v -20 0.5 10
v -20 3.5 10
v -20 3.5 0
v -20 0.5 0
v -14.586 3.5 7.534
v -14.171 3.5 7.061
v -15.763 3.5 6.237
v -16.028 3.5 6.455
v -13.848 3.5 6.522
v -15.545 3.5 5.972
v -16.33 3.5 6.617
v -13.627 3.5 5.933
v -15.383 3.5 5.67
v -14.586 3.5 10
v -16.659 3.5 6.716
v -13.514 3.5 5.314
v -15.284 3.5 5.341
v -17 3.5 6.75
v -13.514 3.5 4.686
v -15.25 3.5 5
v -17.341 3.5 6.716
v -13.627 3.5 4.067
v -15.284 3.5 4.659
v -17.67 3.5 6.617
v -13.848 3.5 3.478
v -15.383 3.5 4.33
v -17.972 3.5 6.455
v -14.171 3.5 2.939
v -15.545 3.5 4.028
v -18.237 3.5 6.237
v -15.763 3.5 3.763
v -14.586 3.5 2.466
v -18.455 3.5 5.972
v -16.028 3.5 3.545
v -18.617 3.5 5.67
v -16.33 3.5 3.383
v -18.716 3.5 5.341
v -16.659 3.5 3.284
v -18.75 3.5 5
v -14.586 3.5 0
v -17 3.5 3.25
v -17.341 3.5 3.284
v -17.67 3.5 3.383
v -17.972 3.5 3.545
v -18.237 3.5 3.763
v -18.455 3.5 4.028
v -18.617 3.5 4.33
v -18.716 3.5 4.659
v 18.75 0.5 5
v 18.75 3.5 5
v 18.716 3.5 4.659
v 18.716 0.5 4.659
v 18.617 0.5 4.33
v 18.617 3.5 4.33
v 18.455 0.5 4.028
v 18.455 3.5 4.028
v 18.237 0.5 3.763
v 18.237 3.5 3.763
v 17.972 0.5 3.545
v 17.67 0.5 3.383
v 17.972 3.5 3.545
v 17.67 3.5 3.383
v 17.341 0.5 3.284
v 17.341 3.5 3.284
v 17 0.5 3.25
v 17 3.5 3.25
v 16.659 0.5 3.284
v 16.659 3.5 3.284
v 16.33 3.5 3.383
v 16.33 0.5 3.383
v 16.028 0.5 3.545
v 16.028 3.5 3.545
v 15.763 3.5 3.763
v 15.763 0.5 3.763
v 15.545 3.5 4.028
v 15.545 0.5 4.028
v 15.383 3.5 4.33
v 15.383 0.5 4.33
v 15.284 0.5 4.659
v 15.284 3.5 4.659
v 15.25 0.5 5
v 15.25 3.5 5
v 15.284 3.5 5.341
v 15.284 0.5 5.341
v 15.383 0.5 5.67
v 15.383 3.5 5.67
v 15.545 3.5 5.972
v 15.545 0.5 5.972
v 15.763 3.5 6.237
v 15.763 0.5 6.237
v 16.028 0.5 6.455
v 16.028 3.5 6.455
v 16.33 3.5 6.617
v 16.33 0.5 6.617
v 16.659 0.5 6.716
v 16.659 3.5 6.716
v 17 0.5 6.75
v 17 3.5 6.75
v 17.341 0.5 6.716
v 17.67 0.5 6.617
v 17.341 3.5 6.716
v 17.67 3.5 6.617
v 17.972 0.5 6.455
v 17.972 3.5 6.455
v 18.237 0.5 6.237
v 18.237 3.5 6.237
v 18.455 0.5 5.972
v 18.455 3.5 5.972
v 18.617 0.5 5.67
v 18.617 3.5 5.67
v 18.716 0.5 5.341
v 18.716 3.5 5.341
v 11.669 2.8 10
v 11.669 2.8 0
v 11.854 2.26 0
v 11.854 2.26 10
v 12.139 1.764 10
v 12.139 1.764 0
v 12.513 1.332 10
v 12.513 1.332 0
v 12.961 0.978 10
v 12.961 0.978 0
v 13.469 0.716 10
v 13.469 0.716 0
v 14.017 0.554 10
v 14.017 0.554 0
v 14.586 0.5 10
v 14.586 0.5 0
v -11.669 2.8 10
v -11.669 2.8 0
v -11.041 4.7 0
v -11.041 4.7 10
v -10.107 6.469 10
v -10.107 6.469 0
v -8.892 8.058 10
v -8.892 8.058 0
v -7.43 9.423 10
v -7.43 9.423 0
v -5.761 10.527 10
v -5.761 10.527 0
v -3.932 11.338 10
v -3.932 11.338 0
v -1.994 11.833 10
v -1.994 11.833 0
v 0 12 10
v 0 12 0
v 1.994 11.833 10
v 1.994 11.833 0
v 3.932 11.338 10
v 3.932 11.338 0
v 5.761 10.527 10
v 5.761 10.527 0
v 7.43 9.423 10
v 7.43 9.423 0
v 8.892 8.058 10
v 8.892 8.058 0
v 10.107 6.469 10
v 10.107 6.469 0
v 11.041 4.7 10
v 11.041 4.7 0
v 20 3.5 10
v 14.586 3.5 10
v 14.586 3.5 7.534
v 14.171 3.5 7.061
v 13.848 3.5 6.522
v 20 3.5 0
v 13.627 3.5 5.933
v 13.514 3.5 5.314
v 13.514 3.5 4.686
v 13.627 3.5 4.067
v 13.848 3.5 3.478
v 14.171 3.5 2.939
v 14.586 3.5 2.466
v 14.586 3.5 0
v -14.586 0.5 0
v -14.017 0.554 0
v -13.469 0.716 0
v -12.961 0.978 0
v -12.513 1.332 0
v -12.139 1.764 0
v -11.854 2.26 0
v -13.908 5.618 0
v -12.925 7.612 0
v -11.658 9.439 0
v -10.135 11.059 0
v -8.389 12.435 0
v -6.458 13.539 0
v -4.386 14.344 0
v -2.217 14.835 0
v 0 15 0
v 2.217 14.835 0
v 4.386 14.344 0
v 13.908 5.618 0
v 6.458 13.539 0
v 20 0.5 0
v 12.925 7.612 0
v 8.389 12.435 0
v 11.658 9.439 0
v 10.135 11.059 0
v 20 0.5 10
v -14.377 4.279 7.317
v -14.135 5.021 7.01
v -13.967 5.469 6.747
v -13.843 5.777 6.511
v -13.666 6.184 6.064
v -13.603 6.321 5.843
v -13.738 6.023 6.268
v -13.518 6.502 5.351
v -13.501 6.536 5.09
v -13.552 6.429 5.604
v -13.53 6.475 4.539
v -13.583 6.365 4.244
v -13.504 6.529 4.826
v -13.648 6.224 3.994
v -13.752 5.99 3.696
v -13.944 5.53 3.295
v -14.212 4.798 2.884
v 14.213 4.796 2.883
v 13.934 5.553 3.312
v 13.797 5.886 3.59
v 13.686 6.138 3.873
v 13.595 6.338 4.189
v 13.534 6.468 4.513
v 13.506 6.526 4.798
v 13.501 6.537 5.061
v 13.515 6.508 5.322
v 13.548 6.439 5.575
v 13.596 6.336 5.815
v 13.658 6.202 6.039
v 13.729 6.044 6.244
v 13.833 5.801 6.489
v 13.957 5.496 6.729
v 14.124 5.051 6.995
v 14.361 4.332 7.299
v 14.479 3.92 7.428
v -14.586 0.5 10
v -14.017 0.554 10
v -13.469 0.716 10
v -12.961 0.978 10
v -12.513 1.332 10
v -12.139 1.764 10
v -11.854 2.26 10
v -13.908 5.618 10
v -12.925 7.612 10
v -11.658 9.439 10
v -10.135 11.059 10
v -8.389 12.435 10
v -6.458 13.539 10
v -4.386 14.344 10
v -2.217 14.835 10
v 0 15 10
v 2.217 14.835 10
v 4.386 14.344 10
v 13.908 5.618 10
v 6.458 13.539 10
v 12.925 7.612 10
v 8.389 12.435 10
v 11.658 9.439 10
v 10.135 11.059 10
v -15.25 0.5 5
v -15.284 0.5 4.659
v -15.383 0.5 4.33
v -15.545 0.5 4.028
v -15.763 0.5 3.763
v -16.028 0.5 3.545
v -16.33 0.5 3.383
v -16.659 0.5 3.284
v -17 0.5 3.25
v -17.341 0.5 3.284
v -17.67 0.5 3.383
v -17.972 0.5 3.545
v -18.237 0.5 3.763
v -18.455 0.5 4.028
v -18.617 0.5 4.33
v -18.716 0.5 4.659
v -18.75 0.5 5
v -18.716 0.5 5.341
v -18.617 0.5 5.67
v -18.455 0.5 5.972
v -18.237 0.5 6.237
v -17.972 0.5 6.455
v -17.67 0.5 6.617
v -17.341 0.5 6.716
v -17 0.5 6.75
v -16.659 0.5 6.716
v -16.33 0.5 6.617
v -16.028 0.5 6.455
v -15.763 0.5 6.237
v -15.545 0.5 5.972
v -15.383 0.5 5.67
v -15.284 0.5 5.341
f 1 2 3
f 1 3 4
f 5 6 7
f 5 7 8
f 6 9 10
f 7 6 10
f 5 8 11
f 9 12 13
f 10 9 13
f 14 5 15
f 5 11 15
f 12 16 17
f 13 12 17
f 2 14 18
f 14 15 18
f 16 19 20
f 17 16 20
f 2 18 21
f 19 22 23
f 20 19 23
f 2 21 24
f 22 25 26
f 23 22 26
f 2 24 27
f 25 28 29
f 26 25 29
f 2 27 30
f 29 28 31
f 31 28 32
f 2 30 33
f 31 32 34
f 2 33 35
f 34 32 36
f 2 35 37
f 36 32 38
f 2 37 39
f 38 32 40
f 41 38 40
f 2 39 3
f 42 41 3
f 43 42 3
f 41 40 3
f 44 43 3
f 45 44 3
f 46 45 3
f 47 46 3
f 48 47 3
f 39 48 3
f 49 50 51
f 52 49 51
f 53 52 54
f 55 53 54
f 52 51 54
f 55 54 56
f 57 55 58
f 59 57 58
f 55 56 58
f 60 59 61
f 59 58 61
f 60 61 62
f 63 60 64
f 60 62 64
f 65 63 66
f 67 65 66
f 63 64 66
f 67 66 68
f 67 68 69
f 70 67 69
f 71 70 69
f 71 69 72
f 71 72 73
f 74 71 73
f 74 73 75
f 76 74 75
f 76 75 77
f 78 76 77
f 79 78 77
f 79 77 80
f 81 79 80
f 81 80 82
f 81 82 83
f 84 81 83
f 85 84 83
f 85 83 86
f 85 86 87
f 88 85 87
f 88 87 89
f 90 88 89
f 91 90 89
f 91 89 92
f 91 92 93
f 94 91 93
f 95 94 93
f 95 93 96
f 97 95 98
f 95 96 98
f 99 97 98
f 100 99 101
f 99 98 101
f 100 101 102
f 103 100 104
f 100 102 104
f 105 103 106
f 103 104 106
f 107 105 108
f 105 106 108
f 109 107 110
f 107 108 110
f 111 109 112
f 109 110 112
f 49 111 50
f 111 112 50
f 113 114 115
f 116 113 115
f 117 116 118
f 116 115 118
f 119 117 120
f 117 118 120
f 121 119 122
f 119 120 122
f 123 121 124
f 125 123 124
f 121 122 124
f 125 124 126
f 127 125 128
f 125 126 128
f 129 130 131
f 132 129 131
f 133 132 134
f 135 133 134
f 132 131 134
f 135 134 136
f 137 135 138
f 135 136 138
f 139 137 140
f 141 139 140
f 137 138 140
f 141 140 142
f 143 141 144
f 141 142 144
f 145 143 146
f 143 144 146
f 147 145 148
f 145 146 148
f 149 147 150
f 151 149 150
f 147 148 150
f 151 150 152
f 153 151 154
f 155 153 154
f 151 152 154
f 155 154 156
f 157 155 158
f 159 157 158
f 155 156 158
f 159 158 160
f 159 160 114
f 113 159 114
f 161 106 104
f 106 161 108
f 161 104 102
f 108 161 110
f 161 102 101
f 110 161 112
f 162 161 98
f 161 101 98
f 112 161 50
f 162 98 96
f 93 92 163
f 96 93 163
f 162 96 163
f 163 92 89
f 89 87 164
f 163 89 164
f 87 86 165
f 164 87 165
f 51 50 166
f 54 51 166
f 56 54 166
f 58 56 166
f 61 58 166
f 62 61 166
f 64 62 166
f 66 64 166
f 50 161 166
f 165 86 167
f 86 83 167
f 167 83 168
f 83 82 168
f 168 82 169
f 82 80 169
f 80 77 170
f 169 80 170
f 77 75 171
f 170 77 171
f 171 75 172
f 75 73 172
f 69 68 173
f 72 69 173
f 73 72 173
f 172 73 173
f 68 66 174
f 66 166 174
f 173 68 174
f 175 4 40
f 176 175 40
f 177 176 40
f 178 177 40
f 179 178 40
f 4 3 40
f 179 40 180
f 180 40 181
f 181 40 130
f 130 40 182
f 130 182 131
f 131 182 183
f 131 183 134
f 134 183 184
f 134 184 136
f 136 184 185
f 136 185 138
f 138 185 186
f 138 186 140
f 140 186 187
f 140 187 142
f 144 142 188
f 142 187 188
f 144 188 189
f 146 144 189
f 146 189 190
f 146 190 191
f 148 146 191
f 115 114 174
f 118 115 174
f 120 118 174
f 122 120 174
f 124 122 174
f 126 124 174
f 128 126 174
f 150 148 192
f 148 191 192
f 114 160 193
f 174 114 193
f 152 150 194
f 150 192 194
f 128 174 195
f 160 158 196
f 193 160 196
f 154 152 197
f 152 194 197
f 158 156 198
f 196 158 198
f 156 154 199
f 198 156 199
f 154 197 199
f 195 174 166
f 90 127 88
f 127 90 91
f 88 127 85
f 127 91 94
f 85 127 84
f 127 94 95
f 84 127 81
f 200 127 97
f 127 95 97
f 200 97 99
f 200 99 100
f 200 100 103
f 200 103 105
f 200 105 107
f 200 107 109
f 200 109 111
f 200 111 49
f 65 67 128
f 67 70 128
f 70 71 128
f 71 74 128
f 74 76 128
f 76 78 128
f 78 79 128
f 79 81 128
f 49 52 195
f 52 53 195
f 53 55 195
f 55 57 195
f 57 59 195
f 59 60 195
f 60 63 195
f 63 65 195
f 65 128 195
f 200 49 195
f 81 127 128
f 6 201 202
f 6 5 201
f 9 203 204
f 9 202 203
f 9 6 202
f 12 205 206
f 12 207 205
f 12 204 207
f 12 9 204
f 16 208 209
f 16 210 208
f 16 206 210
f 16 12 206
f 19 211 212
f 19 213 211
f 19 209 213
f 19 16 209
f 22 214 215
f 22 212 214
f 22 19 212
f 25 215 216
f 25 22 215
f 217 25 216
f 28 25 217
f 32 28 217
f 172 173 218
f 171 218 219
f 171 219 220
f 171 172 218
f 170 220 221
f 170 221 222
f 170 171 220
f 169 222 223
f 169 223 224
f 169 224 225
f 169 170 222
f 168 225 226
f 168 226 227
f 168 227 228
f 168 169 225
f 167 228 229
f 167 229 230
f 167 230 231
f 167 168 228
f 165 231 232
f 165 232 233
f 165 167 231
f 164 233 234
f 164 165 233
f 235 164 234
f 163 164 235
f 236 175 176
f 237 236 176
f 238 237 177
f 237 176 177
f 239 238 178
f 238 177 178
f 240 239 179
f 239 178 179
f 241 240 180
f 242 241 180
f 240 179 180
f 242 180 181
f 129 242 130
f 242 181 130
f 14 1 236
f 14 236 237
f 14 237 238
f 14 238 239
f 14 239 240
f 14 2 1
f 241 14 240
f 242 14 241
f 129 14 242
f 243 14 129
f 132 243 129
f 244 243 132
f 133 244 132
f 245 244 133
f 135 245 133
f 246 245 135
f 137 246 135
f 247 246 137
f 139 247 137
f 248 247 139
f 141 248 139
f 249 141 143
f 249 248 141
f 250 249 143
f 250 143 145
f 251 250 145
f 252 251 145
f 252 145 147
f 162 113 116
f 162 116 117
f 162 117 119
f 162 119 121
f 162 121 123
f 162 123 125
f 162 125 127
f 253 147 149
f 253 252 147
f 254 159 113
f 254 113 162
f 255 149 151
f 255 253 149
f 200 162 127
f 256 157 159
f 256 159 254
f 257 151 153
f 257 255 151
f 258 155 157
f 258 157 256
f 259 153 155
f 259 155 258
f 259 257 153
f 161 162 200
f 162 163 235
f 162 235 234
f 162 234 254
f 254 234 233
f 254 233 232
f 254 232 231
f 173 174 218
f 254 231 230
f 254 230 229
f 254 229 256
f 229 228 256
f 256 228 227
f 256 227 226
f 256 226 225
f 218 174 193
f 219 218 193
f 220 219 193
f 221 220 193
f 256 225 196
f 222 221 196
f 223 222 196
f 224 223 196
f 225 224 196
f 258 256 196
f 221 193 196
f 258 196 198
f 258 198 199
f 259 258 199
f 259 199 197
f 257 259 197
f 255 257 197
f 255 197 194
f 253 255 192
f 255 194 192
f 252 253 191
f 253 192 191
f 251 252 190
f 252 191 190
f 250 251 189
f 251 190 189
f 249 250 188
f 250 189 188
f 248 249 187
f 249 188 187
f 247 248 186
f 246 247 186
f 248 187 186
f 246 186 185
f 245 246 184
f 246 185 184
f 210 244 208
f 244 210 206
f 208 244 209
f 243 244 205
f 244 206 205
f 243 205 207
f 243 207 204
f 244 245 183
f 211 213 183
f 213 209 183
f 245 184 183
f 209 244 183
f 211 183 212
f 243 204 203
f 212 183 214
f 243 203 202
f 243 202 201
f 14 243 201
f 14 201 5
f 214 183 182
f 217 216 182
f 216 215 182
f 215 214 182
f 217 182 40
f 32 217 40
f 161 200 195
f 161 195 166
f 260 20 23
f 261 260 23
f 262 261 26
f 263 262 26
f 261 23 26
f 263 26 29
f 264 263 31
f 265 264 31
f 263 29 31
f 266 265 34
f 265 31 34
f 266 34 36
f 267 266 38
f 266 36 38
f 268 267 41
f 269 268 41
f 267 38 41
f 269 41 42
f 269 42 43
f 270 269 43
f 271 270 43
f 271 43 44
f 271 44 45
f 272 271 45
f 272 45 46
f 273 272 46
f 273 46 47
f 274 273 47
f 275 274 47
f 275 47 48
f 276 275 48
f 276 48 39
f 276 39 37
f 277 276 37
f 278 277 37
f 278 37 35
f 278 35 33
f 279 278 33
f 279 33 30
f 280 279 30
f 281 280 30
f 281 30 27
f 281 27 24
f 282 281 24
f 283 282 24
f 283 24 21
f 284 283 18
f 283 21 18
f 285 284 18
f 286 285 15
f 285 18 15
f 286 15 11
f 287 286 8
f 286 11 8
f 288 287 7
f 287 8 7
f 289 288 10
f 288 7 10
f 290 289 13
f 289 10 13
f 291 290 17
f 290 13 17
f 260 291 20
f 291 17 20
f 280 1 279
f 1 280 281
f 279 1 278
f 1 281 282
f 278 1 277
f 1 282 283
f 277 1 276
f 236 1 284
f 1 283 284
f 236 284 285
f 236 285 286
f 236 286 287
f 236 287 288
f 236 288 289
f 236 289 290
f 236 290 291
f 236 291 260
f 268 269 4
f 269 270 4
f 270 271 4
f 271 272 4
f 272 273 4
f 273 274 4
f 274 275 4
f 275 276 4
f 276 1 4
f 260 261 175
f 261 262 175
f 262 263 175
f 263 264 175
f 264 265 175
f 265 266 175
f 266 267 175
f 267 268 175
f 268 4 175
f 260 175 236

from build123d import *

# Parameters (mm, degrees)
BOSS_EXTRU_2_DEPTH      = 10
ESQUISSE3_R             = 1.75
ENL_V_MAT_EXTRU_2_DEPTH = 4
ESQUISSE4_R             = 3.5
ENL_V_MAT_EXTRU_3_DEPTH = 12.5


with BuildPart() as part:
    # Esquisse1 → Boss.-Extru.2 (new body)
    with BuildSketch(Plane.XY):
        with BuildLine():
            Line((-20, 0.5), (-14.585952146, 0.5))
            ThreePointArc((-14.585952146, 0.5), (-12.728534584, 1.144156202), (-11.668761717, 2.8))
            ThreePointArc((-11.668761717, 2.8), (0, 12), (11.668761717, 2.8))
            ThreePointArc((11.668761717, 2.8), (12.728534584, 1.144156202), (14.585952146, 0.5))
            Line((14.585952146, 0.5), (20, 0.5))
            Line((20, 0.5), (20, 3.5))
            Line((20, 3.5), (14.585952146, 3.5))
            ThreePointArc((14.585952146, 3.5), (0, 15), (-14.585952146, 3.5))
            Line((-14.585952146, 3.5), (-20, 3.5))
            Line((-20, 3.5), (-20, 0.5))
        make_face()
    extrude(amount=BOSS_EXTRU_2_DEPTH)

    # Esquisse3 → Enlèv. mat.-Extru.2 (cut, through all)
    with BuildSketch(Plane(origin=(0, 3.5, 0), x_dir=(1, 0, 0), z_dir=(0, 1, 0))):
        with Locations((-17, -5)):
            Circle(ESQUISSE3_R)
        with Locations((17, -5)):
            Circle(ESQUISSE3_R)
    extrude(amount=-ENL_V_MAT_EXTRU_2_DEPTH, mode=Mode.SUBTRACT)

    # Esquisse4 → Enlèv. mat.-Extru.3 (cut, through all)
    with BuildSketch(Plane(origin=(0, 3.5, 0), x_dir=(1, 0, 0), z_dir=(0, 1, 0))):
        with Locations((-17, -5)):
            Circle(ESQUISSE4_R)
        with Locations((17, -5)):
            Circle(ESQUISSE4_R)
    extrude(amount=ENL_V_MAT_EXTRU_3_DEPTH, mode=Mode.SUBTRACT)


solid = part.part
